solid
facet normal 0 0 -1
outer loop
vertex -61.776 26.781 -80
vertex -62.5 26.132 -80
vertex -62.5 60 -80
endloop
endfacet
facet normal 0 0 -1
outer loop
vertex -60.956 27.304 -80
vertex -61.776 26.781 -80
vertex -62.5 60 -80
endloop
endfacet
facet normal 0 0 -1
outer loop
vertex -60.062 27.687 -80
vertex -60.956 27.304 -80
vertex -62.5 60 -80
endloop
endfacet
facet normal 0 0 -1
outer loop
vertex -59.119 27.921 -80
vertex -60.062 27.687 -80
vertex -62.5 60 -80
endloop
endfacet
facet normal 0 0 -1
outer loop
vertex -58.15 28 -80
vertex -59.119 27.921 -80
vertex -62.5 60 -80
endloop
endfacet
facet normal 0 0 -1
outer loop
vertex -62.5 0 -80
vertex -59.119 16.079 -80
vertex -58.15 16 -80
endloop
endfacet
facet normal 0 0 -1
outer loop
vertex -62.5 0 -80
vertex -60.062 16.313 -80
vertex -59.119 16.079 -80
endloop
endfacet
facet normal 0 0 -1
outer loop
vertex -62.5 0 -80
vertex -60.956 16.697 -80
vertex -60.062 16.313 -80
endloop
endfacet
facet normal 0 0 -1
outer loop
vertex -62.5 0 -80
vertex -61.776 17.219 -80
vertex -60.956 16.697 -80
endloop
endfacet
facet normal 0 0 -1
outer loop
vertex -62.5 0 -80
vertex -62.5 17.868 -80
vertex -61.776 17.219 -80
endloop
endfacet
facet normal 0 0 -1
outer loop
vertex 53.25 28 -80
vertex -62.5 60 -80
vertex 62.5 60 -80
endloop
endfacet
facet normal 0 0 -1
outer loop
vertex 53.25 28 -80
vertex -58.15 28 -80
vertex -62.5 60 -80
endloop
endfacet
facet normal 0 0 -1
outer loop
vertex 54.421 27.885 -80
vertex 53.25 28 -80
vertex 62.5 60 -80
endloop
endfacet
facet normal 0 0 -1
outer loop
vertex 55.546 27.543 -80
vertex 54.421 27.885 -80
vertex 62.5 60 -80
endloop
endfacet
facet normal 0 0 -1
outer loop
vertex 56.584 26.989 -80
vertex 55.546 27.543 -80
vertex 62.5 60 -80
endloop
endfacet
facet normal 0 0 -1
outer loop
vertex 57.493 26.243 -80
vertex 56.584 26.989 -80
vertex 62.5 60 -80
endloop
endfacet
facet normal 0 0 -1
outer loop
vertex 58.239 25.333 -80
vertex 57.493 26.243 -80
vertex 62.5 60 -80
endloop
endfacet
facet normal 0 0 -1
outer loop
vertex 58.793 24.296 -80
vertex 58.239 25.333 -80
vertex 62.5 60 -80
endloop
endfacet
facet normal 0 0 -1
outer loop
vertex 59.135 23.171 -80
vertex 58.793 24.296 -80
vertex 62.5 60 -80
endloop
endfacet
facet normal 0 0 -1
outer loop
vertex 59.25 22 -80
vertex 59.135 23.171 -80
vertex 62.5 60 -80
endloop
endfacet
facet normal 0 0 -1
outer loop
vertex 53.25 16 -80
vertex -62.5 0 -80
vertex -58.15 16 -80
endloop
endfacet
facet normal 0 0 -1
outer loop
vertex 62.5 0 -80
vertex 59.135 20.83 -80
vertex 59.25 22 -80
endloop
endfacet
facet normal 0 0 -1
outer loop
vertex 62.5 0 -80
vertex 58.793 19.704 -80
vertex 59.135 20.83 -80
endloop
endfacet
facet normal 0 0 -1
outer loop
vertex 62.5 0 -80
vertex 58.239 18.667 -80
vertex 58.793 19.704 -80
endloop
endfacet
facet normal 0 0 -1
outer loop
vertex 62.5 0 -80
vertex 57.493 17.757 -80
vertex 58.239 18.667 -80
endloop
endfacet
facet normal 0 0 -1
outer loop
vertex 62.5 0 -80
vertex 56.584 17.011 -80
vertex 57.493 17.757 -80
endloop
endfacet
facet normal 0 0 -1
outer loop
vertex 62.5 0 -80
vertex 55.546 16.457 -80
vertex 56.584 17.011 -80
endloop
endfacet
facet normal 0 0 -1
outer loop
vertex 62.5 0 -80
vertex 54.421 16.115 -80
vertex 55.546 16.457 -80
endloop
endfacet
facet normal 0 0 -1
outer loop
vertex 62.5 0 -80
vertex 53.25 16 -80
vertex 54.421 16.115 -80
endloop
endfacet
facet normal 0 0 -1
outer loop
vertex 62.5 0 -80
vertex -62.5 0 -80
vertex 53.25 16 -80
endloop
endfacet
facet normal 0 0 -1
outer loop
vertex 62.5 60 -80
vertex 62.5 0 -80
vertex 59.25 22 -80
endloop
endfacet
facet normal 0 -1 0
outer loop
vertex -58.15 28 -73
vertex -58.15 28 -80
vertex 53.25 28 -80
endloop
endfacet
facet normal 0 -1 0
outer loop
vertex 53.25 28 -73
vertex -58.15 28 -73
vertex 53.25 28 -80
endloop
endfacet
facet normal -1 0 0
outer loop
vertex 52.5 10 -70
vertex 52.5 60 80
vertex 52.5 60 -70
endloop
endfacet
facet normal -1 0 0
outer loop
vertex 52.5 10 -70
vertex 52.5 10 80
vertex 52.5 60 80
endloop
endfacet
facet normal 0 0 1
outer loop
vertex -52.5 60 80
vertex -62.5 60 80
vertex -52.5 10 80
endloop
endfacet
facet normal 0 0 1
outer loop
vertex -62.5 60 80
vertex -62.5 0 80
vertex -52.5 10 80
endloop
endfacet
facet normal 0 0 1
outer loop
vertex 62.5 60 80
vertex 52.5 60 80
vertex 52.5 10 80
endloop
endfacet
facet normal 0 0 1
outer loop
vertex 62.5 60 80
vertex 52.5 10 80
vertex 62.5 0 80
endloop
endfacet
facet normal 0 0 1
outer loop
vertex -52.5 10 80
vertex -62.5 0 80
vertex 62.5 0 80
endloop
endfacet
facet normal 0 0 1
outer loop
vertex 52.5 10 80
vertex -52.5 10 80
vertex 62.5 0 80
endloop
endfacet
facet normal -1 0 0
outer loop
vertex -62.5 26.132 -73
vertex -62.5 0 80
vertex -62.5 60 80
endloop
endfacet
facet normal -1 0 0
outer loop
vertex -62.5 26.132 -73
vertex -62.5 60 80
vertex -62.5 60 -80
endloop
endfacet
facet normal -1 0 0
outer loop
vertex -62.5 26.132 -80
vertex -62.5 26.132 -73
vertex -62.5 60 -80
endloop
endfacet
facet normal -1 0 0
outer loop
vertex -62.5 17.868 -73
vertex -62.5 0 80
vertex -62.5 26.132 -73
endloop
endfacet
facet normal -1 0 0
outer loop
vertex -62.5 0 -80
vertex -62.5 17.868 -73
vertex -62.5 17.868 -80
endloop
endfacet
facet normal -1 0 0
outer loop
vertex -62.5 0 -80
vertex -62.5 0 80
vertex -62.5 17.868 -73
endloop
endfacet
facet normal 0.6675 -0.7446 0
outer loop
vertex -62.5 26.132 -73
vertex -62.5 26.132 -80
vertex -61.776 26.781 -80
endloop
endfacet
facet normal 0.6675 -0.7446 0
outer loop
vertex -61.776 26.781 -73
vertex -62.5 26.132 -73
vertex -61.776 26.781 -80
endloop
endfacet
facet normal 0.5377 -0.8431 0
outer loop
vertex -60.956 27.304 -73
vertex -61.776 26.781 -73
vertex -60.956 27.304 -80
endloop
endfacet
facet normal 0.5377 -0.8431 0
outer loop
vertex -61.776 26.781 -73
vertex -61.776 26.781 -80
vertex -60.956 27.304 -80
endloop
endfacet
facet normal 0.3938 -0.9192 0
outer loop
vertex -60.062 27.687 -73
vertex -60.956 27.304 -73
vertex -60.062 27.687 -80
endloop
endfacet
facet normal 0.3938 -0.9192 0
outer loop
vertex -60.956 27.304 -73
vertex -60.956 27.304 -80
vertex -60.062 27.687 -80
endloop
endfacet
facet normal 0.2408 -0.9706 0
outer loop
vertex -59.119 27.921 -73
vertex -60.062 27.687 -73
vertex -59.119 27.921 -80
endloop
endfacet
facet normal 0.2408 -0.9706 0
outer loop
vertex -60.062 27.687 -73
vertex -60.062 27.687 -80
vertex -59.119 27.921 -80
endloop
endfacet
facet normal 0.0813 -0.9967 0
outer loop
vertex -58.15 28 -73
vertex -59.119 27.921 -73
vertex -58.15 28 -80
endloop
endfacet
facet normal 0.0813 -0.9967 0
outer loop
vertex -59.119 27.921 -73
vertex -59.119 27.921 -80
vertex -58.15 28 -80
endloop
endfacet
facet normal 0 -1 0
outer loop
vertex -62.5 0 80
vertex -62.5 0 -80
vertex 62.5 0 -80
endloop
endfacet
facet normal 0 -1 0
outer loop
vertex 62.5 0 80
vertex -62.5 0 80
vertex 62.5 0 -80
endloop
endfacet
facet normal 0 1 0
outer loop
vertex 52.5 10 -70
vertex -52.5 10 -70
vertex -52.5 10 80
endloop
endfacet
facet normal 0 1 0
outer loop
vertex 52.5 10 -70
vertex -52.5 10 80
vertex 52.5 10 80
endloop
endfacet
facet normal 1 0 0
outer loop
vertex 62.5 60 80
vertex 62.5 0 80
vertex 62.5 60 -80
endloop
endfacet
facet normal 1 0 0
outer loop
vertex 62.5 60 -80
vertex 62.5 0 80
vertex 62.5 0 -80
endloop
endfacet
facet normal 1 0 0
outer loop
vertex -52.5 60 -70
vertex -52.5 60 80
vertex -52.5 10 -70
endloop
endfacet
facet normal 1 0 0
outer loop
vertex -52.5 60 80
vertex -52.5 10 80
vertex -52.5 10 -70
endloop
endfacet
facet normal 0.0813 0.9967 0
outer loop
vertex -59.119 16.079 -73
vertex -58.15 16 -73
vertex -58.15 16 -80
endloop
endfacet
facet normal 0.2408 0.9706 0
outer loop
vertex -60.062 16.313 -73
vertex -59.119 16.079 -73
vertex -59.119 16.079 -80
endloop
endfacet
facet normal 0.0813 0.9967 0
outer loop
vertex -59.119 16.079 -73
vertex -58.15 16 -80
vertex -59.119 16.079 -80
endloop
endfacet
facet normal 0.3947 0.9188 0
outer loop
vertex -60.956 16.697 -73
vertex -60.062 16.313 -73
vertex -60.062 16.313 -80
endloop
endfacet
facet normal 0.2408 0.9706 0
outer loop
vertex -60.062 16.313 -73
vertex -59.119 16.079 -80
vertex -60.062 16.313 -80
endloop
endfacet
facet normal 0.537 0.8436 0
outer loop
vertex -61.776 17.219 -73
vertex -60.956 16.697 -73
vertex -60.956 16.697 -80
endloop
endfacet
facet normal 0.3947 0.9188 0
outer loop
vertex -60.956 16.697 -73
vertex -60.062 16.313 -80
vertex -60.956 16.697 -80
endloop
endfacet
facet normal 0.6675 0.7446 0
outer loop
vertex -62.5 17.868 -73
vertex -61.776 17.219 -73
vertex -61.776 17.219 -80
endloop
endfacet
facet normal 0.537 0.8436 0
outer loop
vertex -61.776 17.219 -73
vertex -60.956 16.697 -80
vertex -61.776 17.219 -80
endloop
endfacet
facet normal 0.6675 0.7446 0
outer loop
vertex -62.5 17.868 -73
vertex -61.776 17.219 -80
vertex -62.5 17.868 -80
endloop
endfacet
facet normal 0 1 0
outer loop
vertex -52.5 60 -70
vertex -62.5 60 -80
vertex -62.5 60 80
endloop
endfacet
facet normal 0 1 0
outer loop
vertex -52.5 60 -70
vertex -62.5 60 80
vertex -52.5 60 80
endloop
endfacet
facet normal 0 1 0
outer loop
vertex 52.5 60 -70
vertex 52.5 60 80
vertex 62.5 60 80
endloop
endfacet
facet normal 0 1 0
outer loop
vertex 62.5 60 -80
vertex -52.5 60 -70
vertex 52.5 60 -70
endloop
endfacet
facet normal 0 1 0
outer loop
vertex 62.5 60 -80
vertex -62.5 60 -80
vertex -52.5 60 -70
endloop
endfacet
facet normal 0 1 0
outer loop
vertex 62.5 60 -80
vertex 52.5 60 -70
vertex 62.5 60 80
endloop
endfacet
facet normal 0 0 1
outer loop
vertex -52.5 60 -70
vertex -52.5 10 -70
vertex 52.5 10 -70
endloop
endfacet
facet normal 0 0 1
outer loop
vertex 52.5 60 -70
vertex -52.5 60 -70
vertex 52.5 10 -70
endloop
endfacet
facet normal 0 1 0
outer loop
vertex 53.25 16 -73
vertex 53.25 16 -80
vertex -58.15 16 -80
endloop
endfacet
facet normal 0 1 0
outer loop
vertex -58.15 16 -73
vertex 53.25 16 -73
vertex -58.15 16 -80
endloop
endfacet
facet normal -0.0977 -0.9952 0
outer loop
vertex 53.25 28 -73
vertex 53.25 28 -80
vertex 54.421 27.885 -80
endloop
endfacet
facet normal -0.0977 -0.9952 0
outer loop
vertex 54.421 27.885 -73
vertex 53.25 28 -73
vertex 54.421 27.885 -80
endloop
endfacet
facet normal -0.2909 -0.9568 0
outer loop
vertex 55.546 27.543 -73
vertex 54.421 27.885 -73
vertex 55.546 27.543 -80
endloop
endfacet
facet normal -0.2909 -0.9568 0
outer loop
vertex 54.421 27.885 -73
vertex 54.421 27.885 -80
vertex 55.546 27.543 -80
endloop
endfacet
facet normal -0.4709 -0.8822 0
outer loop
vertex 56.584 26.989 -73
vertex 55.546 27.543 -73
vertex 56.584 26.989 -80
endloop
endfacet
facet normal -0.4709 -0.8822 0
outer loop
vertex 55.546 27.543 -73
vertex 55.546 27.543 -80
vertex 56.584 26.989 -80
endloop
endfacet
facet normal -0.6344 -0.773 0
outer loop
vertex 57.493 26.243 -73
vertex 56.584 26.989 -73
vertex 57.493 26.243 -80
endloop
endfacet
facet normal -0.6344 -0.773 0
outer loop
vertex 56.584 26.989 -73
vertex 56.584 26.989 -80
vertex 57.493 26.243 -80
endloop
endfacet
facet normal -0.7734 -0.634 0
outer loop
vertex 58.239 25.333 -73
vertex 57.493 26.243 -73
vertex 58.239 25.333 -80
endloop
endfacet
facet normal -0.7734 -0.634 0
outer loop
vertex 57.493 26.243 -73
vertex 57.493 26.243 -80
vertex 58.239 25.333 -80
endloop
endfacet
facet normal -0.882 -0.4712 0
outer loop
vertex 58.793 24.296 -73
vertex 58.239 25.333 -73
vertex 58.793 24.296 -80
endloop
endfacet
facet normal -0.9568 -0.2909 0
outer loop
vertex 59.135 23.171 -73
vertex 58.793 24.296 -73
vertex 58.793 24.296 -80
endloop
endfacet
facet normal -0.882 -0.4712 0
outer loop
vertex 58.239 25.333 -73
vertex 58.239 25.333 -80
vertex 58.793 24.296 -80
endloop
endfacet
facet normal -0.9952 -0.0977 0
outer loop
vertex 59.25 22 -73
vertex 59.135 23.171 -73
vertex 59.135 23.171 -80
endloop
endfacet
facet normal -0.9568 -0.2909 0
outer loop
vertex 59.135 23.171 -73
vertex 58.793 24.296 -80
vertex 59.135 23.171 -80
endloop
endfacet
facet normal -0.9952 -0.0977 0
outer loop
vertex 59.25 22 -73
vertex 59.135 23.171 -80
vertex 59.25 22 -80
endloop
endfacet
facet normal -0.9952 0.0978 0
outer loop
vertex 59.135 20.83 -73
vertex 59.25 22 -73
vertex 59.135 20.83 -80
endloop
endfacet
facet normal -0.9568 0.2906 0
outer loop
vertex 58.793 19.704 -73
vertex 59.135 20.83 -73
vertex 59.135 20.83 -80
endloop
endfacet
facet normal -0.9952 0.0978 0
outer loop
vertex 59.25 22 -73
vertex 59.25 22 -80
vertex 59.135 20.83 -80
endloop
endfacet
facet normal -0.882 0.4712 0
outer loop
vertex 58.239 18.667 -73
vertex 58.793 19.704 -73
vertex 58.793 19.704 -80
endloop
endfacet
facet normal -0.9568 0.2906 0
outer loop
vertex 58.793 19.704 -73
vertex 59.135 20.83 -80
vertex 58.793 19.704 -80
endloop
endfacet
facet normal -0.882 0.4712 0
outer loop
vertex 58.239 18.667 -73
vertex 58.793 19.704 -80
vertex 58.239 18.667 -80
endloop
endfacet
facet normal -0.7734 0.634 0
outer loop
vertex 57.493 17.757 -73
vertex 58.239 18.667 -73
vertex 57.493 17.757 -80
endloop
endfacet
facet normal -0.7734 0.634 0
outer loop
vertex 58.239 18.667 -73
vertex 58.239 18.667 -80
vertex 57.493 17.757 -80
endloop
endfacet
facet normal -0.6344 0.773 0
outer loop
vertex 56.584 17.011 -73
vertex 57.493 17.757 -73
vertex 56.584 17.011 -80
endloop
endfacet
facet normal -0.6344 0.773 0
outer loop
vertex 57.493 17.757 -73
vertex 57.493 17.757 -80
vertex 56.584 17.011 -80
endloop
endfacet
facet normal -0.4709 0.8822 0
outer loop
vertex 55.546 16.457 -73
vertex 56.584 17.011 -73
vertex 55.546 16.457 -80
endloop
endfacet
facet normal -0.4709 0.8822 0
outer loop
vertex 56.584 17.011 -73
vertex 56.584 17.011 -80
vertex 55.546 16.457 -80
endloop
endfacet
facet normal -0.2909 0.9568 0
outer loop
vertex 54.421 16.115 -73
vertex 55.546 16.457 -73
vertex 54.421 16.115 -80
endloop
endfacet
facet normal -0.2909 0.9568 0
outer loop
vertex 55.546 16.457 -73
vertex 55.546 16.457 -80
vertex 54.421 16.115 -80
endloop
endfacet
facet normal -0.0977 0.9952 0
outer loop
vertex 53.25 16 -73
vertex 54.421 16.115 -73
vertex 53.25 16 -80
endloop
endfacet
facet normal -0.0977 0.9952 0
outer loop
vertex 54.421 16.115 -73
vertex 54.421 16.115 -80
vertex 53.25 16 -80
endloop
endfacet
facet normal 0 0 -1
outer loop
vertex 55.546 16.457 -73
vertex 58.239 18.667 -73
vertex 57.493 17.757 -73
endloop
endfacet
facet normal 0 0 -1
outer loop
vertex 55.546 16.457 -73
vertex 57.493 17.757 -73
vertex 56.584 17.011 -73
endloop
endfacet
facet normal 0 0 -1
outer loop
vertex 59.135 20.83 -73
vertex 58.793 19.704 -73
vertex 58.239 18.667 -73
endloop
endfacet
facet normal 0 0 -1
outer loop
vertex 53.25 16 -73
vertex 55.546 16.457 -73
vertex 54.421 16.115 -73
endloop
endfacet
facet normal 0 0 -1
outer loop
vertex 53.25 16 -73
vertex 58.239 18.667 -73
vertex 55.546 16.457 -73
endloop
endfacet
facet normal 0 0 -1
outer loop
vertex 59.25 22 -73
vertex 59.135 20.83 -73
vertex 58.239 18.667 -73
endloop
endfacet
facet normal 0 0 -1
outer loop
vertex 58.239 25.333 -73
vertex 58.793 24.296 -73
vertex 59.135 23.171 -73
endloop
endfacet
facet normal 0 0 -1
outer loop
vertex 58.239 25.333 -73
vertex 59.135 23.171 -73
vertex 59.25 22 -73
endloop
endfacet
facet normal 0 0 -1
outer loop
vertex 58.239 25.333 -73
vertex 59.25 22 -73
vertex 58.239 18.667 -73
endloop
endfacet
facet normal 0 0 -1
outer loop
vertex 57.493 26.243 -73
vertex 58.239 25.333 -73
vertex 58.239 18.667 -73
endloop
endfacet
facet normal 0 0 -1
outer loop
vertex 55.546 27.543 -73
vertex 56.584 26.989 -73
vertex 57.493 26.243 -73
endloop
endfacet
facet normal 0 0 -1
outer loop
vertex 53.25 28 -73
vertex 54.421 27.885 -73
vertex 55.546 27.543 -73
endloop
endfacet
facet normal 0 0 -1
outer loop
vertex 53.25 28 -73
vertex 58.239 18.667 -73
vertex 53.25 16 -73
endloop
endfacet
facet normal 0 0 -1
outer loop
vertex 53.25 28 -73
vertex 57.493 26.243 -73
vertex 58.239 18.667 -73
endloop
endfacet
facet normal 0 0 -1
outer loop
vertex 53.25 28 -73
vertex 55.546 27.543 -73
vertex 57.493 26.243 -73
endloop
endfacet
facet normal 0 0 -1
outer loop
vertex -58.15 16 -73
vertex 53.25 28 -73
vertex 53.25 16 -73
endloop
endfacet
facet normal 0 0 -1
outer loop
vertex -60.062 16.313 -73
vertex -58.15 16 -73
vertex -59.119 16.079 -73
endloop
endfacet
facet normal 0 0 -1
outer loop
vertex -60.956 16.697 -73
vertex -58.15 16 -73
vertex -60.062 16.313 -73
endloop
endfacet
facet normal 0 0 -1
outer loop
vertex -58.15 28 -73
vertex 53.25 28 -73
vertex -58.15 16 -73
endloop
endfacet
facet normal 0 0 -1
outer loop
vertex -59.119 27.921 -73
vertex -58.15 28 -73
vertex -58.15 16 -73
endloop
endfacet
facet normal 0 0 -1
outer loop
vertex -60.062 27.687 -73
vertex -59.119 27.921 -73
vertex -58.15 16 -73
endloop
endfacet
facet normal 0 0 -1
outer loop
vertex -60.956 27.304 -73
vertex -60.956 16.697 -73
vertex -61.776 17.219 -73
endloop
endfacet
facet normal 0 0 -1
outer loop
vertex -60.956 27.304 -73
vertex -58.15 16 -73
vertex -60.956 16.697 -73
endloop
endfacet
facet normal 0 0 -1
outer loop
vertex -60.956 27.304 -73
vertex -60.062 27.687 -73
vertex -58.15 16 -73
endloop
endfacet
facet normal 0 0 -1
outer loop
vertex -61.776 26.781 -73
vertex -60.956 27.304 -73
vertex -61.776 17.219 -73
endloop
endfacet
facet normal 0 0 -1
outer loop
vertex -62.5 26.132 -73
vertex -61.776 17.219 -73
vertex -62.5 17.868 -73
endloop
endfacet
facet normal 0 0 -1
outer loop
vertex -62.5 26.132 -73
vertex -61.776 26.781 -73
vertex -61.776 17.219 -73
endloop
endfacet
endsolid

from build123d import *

# Parameters (mm, degrees)
SKETCH1_W           = 125
SKETCH1_H           = 160
BOSS_EXTRUDE1_DEPTH = 60
SHELL1_T            = -10
CUT_EXTRUDE1_DEPTH  = 7


with BuildPart() as part:
    # Sketch1 → Boss-Extrude1 (new body)
    with BuildSketch(Plane(origin=(0, 0, 0), x_dir=(1, 0, 0), z_dir=(0, 1, 0))):
        Rectangle(SKETCH1_W, SKETCH1_H)
    extrude(amount=BOSS_EXTRUDE1_DEPTH)

    # Shell1
    shell1_openings = [part.faces().sort_by_distance(p)[0] for p in [
        (0, 60, 0),
        (0, 30, 80),
    ]]
    offset(amount=SHELL1_T, openings=shell1_openings, kind=Kind.INTERSECTION)

    # Sketch2 → Cut-Extrude1 (cut)
    with BuildSketch(Plane(origin=(0, 0, -80), x_dir=(-1, 0, 0), z_dir=(0, 0, -1))):
        with BuildLine():
            Line((58.149914344, 28.0000547), (-53.250098626, 28.0000547))
            ThreePointArc((-53.250098626, 28.0000547), (-59.250098626, 22.0000547), (-53.250098626, 16.0000547))
            Line((-53.250098626, 16.0000547), (58.149914344, 16.000100476))
            ThreePointArc((58.149914344, 16.000100476), (64.149891456, 22.000077588), (58.149914344, 28.0000547))
        make_face()
    extrude(amount=-CUT_EXTRUDE1_DEPTH, mode=Mode.SUBTRACT)


solid = part.part
